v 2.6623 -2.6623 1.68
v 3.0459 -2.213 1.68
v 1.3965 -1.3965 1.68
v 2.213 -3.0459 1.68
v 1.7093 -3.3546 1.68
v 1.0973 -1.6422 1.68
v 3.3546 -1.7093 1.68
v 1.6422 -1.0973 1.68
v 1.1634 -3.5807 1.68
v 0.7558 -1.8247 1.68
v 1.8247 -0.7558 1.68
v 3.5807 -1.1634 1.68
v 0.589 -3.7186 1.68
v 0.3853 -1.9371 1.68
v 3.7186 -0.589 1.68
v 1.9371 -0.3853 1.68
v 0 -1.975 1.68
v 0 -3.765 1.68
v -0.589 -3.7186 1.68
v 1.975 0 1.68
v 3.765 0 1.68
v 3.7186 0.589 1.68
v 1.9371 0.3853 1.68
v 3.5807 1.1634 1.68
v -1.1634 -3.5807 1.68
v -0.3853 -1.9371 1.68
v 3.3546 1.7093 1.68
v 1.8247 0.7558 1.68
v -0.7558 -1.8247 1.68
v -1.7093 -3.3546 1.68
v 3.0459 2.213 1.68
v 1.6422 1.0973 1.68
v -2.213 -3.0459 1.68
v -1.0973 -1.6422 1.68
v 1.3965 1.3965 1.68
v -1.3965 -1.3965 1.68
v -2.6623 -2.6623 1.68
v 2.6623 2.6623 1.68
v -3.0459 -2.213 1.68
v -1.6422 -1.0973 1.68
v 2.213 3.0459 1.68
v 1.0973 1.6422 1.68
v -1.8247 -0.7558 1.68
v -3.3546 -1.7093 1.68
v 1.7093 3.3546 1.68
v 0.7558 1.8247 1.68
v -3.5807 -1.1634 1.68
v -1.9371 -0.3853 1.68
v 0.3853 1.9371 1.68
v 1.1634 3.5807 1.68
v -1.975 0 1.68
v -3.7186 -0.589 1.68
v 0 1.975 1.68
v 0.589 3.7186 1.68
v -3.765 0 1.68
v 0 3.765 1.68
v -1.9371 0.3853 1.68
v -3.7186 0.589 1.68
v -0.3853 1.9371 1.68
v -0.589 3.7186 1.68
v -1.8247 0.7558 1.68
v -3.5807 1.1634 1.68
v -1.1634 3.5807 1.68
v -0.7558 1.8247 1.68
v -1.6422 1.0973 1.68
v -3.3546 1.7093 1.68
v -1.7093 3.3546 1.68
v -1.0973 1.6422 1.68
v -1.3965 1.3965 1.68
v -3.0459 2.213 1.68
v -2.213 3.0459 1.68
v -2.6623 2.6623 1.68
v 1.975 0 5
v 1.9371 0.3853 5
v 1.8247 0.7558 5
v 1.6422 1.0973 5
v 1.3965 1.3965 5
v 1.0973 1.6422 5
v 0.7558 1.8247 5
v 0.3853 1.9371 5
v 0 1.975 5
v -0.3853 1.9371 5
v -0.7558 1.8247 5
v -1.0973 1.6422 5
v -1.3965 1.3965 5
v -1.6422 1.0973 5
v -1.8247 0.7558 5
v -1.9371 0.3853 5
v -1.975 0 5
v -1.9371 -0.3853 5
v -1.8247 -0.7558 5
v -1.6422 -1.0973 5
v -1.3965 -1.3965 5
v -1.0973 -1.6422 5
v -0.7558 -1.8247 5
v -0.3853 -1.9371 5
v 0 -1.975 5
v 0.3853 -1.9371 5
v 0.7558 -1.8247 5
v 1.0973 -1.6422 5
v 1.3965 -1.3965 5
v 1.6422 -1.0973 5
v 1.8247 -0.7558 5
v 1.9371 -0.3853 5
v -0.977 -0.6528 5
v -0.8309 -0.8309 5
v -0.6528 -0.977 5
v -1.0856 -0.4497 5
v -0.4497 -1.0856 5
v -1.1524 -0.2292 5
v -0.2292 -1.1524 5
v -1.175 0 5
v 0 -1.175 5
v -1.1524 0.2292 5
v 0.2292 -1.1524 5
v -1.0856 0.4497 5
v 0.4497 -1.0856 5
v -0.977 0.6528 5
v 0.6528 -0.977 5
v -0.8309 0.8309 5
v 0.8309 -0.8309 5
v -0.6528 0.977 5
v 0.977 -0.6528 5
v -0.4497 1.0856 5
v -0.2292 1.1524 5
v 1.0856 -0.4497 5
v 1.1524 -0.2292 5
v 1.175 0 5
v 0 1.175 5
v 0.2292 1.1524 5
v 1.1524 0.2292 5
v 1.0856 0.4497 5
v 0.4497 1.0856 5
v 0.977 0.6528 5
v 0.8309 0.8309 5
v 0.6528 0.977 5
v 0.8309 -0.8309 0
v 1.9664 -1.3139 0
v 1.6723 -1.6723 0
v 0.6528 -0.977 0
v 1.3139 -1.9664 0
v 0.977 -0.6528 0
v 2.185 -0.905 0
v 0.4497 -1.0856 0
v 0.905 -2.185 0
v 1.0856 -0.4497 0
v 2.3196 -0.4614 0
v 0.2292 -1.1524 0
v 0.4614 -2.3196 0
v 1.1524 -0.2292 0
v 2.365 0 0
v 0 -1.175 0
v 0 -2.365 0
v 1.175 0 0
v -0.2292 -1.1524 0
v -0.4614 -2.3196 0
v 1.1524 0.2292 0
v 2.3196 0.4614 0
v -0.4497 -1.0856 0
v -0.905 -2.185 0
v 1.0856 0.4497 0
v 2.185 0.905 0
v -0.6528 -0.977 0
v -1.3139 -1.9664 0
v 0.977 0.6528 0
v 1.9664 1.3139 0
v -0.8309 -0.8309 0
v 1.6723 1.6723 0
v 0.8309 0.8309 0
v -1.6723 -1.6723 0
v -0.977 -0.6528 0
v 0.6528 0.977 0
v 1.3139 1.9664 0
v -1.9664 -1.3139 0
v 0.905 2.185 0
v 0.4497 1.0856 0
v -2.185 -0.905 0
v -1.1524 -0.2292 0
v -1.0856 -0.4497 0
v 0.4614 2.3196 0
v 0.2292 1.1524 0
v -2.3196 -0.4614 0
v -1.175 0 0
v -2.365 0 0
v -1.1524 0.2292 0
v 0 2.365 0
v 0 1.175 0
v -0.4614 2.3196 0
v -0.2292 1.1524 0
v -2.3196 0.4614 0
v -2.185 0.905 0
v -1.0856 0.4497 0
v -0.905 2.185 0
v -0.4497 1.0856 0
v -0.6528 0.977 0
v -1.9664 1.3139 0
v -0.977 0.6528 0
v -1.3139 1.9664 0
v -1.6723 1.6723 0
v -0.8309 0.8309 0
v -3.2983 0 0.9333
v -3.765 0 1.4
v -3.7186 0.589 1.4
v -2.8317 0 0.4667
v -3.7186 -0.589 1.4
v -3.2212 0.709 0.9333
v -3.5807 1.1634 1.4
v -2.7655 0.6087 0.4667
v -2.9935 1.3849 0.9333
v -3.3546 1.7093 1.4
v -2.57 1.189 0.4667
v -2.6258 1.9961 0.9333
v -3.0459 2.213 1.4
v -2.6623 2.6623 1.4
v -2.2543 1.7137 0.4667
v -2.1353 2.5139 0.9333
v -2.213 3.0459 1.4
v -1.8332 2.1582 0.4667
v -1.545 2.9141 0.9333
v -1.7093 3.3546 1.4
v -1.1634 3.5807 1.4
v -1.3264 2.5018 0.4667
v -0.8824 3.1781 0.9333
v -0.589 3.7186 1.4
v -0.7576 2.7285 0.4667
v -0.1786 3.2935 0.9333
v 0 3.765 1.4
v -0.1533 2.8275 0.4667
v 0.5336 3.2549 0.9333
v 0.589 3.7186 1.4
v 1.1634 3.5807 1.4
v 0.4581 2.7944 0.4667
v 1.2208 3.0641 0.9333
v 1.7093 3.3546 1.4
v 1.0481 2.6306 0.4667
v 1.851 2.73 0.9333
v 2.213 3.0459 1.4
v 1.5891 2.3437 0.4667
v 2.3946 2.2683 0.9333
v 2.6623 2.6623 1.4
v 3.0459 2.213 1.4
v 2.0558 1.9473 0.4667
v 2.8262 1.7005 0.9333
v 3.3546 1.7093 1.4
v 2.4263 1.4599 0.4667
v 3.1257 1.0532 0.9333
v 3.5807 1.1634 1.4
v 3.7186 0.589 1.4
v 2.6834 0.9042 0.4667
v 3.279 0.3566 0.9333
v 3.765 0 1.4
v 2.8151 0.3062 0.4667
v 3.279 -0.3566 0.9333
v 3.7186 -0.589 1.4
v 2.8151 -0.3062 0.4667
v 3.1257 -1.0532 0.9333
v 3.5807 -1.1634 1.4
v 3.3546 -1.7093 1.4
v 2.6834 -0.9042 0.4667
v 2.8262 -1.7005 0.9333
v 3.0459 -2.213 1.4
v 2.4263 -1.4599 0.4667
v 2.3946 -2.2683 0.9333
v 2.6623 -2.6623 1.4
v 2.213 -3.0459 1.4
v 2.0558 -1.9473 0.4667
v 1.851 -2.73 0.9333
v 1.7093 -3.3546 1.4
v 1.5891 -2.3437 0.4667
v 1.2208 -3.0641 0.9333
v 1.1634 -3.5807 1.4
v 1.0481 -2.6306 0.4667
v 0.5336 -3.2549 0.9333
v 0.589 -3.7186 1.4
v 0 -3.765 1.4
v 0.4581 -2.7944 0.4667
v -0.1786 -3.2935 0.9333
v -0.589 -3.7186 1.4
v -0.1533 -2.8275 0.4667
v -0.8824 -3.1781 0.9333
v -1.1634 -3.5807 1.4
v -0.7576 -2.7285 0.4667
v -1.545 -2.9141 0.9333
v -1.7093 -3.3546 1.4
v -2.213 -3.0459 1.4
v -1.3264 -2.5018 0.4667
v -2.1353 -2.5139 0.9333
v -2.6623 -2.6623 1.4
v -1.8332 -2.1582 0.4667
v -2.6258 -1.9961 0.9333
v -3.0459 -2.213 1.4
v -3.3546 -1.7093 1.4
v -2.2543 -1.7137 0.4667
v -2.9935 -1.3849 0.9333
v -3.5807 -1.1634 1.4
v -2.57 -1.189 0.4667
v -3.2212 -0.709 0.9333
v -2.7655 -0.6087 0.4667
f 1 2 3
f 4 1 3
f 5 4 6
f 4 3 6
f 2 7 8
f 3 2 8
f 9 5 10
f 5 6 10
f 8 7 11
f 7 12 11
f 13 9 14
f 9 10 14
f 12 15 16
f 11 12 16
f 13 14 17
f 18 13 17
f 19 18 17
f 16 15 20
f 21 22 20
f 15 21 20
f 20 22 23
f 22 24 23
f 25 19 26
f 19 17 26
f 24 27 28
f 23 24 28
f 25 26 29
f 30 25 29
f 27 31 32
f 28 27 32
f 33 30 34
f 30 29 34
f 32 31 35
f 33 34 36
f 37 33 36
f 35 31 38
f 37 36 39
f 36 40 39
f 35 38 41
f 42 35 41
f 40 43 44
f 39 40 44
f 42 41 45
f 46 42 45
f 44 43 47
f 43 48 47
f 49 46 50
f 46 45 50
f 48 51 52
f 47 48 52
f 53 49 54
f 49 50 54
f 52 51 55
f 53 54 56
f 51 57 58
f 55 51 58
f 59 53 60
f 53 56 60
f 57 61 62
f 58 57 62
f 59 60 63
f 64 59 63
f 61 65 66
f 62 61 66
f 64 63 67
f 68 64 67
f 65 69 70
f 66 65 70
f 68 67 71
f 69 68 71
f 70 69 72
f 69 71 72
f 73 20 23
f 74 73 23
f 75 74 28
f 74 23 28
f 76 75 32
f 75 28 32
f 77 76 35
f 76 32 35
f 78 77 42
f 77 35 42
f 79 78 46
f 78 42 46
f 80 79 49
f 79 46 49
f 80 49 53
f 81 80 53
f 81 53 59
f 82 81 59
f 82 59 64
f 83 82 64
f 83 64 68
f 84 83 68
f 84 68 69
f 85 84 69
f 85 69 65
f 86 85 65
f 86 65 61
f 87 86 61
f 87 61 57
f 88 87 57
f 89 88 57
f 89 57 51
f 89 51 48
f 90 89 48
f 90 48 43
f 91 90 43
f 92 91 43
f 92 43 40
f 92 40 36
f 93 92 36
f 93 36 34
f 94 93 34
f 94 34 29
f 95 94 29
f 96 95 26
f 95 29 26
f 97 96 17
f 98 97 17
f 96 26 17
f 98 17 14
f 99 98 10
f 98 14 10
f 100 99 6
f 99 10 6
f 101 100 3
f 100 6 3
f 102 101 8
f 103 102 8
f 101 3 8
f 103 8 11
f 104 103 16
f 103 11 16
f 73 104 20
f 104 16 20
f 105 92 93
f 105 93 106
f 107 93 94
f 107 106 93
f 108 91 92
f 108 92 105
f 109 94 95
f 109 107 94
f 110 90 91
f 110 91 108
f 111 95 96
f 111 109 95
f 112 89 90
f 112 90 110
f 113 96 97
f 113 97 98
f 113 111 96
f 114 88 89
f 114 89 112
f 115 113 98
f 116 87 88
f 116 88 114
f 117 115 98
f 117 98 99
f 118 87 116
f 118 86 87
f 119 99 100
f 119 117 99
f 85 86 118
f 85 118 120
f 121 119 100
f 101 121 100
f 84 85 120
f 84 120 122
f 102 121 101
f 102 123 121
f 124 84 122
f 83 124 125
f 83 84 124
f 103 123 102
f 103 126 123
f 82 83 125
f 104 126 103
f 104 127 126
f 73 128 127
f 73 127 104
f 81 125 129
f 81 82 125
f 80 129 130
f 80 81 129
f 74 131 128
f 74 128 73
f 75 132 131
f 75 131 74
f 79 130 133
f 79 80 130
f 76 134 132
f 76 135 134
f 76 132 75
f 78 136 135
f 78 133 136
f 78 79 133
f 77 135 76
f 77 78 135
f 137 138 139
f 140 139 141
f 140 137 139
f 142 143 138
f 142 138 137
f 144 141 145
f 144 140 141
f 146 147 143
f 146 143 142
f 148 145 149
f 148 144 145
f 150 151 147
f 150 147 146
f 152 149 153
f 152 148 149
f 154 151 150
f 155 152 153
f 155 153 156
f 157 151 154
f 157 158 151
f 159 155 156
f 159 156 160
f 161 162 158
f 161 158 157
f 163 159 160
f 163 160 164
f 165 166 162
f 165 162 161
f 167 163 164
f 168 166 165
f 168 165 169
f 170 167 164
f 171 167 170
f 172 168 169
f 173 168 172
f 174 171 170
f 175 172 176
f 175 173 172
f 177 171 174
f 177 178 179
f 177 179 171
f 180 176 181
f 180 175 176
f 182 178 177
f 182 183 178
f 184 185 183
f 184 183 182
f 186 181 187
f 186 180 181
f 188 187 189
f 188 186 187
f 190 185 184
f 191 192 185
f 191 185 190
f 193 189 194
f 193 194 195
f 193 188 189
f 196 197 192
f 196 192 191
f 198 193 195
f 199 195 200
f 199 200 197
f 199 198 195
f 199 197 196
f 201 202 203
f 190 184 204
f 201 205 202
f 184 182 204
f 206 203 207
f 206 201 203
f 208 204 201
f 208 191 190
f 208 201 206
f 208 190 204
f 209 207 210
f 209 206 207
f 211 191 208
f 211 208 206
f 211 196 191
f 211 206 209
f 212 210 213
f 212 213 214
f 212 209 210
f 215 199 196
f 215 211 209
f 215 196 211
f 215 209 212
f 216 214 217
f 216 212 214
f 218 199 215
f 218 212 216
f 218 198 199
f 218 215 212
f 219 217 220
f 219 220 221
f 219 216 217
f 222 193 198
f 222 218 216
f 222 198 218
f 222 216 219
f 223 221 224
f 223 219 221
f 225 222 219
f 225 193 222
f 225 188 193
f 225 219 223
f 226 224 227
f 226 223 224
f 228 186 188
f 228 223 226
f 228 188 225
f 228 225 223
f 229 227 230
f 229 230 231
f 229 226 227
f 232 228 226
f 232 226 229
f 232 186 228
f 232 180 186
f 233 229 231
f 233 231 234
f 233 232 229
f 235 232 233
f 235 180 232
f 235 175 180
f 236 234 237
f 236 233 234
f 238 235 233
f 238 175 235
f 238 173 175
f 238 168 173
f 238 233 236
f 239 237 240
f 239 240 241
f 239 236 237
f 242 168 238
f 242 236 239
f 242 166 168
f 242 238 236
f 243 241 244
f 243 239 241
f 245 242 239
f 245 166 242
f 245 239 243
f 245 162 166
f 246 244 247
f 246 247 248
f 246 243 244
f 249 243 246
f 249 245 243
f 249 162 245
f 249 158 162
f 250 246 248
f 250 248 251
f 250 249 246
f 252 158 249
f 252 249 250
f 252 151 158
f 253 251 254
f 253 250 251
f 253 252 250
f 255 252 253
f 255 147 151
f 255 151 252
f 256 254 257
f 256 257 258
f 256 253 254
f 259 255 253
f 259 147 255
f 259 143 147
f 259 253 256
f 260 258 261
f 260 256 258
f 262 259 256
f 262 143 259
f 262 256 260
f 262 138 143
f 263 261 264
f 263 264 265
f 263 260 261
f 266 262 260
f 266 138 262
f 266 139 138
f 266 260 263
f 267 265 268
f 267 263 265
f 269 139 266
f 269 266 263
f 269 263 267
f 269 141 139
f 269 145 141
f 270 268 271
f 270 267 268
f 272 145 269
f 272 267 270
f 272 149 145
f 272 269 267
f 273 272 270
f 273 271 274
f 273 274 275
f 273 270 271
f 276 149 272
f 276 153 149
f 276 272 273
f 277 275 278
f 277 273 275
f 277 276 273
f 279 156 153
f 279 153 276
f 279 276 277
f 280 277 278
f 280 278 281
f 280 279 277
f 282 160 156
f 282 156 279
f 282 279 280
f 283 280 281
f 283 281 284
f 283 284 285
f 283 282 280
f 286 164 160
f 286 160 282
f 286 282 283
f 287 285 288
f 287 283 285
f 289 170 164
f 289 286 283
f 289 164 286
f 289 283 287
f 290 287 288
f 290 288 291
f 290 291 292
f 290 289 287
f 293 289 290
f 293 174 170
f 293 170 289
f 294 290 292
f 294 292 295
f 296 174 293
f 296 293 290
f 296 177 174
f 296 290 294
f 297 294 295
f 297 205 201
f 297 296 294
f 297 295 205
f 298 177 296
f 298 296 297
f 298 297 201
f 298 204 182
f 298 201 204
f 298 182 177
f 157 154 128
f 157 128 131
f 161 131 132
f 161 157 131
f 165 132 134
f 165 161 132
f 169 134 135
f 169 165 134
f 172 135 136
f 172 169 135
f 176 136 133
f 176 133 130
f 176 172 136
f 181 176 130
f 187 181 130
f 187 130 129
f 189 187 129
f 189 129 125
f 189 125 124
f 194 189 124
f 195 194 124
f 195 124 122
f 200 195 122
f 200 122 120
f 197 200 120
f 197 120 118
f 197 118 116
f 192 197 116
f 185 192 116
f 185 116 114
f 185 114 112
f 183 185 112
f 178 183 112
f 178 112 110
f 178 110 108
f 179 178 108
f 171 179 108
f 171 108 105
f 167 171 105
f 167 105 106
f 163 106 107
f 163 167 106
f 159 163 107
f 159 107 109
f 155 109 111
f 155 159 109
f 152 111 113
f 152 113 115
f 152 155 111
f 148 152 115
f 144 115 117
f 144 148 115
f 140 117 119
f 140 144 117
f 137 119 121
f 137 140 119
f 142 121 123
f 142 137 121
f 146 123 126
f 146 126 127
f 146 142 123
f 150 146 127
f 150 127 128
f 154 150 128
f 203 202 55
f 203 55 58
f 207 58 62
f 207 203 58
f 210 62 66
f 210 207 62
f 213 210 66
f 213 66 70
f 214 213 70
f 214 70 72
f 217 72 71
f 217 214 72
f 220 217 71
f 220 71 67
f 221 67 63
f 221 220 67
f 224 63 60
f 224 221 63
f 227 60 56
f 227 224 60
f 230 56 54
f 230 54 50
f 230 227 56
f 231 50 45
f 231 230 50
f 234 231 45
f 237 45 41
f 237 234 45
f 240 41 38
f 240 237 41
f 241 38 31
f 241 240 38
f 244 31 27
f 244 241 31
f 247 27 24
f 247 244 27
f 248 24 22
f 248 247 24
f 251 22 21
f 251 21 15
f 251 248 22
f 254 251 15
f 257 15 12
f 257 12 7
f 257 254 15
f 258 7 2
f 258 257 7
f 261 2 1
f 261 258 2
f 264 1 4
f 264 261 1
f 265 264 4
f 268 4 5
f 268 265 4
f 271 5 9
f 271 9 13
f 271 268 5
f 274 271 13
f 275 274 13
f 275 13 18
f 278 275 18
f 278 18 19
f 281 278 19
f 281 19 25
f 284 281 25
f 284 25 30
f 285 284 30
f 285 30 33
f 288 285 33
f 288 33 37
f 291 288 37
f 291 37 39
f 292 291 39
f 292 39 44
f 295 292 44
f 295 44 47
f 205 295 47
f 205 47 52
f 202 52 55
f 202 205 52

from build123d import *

# Parameters (mm, degrees)
ESBO_O1_R                = 1.975
ESBO_O1_R_2              = 1.175
RESSALTO_EXTRUS_O1_DEPTH = 5
ESBO_O2_R                = 3.765
ESBO_O2_R_2              = 1.175
RESSALTO_EXTRUS_O2_DEPTH = 1.68
CHANFRO1_SIZE            = 1.4


with BuildPart() as part:
    # Esboço1 → Ressalto-extrusão1 (new body)
    with BuildSketch(Plane.XY):
        Circle(ESBO_O1_R)
        Circle(ESBO_O1_R_2, mode=Mode.SUBTRACT)
    extrude(amount=RESSALTO_EXTRUS_O1_DEPTH)

    # Esboço2 → Ressalto-extrusão2 (add)
    with BuildSketch(Plane(origin=(0, 0, 0), x_dir=(-1, 0, 0), z_dir=(0, 0, -1))):
        Circle(ESBO_O2_R)
        with Locations(Location((0, 0, 0), (0, 0, 180))):
            Circle(ESBO_O2_R_2, mode=Mode.SUBTRACT)
    extrude(amount=-RESSALTO_EXTRUS_O2_DEPTH)

    # Chanfro1
    chanfro1_edges = [part.edges().sort_by_distance(p)[0] for p in [
        (3.765, 0, 0),
    ]]
    chamfer(chanfro1_edges, length=CHANFRO1_SIZE)


solid = part.part
